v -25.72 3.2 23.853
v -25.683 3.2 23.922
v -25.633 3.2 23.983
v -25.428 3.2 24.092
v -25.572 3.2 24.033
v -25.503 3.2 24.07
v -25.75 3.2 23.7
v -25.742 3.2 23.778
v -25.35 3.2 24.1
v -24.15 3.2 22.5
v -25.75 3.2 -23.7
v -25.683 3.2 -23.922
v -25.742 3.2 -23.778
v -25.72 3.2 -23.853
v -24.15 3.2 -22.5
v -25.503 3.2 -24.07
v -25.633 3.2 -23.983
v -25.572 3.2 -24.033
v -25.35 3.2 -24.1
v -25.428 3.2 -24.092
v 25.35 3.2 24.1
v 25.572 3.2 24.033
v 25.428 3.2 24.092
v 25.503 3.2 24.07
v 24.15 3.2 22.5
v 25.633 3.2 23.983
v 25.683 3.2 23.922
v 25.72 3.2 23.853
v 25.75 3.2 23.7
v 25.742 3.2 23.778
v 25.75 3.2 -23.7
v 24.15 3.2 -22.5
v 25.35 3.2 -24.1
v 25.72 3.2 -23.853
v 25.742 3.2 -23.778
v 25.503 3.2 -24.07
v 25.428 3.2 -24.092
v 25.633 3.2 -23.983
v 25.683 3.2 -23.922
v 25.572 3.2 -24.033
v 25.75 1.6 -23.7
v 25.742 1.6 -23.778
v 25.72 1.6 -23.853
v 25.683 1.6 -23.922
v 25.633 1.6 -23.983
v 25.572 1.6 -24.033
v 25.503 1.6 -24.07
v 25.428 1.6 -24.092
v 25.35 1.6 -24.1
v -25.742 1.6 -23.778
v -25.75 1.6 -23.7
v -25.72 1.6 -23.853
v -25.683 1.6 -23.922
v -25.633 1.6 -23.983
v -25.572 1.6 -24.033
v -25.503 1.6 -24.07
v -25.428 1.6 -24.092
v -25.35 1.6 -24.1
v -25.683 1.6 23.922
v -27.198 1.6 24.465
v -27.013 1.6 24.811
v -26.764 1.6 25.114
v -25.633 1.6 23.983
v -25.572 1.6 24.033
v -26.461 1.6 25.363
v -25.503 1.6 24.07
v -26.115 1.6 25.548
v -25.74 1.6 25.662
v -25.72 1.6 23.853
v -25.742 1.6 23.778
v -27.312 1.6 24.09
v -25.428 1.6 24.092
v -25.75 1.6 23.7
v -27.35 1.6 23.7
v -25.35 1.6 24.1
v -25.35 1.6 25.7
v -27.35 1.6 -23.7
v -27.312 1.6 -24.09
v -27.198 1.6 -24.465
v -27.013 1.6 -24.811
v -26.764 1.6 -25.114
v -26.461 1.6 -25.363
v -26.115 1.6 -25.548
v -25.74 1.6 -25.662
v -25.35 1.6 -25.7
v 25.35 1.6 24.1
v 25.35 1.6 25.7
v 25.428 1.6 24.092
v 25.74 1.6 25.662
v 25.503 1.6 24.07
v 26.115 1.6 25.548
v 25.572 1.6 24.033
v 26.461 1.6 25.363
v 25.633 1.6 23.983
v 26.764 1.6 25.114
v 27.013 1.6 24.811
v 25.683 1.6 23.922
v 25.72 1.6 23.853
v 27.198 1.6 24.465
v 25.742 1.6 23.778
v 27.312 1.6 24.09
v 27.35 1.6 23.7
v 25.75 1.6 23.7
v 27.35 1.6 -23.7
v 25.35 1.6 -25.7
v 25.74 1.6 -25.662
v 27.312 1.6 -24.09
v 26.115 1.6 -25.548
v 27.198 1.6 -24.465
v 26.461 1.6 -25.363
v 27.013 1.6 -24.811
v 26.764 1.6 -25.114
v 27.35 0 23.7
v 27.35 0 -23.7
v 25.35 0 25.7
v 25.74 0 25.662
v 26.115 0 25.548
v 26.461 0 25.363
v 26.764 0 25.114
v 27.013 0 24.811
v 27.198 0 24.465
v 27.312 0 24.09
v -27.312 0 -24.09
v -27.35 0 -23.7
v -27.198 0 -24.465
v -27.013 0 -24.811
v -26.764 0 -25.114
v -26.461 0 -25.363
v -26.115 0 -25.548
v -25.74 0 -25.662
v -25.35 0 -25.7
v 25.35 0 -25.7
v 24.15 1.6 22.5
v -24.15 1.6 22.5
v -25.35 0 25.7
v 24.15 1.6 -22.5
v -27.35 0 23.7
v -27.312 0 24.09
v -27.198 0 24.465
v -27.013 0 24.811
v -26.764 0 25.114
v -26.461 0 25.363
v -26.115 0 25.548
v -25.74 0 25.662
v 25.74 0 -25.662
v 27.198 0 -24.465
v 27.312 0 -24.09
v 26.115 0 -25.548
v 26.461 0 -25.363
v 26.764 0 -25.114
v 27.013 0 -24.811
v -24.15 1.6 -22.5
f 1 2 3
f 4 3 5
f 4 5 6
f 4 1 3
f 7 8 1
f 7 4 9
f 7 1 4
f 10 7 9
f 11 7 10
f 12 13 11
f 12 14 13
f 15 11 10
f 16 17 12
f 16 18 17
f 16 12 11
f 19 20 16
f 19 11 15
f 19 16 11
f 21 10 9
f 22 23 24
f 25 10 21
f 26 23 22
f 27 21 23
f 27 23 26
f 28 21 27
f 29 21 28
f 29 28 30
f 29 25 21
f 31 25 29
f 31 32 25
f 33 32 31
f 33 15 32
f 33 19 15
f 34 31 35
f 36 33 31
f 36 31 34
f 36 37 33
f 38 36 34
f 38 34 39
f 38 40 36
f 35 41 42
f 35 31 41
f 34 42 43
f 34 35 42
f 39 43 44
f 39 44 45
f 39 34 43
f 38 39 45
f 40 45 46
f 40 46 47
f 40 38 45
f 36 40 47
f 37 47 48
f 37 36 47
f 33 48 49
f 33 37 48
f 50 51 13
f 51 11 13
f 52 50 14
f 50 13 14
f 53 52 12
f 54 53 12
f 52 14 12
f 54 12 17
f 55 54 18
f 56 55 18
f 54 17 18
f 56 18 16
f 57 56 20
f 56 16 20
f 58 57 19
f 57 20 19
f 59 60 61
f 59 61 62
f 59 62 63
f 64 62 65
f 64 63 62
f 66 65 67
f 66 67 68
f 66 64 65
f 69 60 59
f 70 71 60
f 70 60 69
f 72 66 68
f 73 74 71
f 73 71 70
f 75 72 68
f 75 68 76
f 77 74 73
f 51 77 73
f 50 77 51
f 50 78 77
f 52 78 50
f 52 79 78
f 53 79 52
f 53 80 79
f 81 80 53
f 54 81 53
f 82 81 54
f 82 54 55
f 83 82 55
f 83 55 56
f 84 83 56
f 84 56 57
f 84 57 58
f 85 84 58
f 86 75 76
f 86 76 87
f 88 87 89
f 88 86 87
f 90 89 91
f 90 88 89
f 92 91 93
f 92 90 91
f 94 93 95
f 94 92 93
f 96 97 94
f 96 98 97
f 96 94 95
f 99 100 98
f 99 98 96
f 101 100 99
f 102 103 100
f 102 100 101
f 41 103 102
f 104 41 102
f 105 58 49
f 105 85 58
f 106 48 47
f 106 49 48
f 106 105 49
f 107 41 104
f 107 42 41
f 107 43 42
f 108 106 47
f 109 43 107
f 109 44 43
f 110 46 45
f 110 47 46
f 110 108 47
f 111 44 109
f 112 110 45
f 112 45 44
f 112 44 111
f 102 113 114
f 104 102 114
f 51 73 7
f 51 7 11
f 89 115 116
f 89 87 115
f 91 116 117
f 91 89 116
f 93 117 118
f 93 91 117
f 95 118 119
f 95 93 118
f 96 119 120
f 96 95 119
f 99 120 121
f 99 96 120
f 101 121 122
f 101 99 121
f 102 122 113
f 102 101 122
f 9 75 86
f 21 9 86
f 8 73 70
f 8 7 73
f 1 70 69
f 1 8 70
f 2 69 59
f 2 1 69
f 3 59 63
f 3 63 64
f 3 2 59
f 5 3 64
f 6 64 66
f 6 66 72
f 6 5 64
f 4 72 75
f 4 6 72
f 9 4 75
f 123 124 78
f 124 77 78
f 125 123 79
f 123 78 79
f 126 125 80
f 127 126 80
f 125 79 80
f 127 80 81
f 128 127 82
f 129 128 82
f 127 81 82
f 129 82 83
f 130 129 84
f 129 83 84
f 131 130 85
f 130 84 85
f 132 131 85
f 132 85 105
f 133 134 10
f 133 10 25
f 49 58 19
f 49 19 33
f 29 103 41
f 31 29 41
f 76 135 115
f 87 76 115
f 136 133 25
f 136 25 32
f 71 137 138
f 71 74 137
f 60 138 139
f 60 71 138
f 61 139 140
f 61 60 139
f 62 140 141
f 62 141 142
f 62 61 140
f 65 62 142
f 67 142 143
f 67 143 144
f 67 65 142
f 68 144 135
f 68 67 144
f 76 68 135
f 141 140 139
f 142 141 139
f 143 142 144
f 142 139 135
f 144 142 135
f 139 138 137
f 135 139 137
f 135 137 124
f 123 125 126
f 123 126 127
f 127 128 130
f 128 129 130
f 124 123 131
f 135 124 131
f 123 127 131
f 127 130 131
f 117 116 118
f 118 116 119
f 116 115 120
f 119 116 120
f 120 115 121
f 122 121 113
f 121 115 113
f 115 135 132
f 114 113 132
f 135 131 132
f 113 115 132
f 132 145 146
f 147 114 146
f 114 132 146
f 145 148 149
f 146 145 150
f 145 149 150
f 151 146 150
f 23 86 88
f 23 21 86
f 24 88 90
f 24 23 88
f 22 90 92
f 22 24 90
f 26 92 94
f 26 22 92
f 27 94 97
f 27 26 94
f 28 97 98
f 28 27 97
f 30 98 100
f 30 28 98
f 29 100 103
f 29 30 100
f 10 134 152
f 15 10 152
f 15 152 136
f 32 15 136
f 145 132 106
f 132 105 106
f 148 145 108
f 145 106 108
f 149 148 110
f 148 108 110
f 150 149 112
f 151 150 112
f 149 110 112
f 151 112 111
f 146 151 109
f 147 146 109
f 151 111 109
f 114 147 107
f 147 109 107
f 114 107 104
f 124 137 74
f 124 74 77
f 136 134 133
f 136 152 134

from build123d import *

# Parameters (mm, degrees)
SKETCH1_W           = 54.7
SKETCH1_H           = 51.4
BOSS_EXTRUDE1_DEPTH = 1.6
SKETCH1_3_W         = 51.5
SKETCH1_3_H         = 48.2
SKETCH1_3_W_2       = 48.3
SKETCH1_3_H_2       = 45
BOSS_EXTRUDE2_DEPTH = 3.2
FILLET1_R           = 2
FILLET2_R           = 0.4


with BuildPart() as part:
    # Sketch1 → Boss-Extrude1 (new body)
    with BuildSketch(Plane(origin=(0, 0, 0), x_dir=(1, 0, 0), z_dir=(0, 1, 0))):
        Rectangle(SKETCH1_W, SKETCH1_H)
    extrude(amount=BOSS_EXTRUDE1_DEPTH)

    # Sketch1<3> → Boss-Extrude2 (add)
    with BuildSketch(Plane(origin=(0, 0, 0), x_dir=(1, 0, 0), z_dir=(0, 1, 0))):
        Rectangle(SKETCH1_3_W, SKETCH1_3_H)
        Rectangle(SKETCH1_3_W_2, SKETCH1_3_H_2, mode=Mode.SUBTRACT)
    extrude(amount=BOSS_EXTRUDE2_DEPTH)

    # Fillet1
    fillet1_edges = [part.edges().sort_by_distance(p)[0] for p in [
        (-27.35, 0.8, 25.7),
        (27.35, 0.8, 25.7),
        (-27.35, 0.8, -25.7),
        (27.35, 0.8, -25.7),
    ]]
    fillet(fillet1_edges, radius=FILLET1_R)

    # Fillet2
    fillet2_edges = [part.edges().sort_by_distance(p)[0] for p in [
        (25.75, 2.4, -24.1),
        (25.75, 2.4, 24.1),
        (-25.75, 2.4, 24.1),
        (-25.75, 2.4, -24.1),
    ]]
    fillet(fillet2_edges, radius=FILLET2_R)


solid = part.part
